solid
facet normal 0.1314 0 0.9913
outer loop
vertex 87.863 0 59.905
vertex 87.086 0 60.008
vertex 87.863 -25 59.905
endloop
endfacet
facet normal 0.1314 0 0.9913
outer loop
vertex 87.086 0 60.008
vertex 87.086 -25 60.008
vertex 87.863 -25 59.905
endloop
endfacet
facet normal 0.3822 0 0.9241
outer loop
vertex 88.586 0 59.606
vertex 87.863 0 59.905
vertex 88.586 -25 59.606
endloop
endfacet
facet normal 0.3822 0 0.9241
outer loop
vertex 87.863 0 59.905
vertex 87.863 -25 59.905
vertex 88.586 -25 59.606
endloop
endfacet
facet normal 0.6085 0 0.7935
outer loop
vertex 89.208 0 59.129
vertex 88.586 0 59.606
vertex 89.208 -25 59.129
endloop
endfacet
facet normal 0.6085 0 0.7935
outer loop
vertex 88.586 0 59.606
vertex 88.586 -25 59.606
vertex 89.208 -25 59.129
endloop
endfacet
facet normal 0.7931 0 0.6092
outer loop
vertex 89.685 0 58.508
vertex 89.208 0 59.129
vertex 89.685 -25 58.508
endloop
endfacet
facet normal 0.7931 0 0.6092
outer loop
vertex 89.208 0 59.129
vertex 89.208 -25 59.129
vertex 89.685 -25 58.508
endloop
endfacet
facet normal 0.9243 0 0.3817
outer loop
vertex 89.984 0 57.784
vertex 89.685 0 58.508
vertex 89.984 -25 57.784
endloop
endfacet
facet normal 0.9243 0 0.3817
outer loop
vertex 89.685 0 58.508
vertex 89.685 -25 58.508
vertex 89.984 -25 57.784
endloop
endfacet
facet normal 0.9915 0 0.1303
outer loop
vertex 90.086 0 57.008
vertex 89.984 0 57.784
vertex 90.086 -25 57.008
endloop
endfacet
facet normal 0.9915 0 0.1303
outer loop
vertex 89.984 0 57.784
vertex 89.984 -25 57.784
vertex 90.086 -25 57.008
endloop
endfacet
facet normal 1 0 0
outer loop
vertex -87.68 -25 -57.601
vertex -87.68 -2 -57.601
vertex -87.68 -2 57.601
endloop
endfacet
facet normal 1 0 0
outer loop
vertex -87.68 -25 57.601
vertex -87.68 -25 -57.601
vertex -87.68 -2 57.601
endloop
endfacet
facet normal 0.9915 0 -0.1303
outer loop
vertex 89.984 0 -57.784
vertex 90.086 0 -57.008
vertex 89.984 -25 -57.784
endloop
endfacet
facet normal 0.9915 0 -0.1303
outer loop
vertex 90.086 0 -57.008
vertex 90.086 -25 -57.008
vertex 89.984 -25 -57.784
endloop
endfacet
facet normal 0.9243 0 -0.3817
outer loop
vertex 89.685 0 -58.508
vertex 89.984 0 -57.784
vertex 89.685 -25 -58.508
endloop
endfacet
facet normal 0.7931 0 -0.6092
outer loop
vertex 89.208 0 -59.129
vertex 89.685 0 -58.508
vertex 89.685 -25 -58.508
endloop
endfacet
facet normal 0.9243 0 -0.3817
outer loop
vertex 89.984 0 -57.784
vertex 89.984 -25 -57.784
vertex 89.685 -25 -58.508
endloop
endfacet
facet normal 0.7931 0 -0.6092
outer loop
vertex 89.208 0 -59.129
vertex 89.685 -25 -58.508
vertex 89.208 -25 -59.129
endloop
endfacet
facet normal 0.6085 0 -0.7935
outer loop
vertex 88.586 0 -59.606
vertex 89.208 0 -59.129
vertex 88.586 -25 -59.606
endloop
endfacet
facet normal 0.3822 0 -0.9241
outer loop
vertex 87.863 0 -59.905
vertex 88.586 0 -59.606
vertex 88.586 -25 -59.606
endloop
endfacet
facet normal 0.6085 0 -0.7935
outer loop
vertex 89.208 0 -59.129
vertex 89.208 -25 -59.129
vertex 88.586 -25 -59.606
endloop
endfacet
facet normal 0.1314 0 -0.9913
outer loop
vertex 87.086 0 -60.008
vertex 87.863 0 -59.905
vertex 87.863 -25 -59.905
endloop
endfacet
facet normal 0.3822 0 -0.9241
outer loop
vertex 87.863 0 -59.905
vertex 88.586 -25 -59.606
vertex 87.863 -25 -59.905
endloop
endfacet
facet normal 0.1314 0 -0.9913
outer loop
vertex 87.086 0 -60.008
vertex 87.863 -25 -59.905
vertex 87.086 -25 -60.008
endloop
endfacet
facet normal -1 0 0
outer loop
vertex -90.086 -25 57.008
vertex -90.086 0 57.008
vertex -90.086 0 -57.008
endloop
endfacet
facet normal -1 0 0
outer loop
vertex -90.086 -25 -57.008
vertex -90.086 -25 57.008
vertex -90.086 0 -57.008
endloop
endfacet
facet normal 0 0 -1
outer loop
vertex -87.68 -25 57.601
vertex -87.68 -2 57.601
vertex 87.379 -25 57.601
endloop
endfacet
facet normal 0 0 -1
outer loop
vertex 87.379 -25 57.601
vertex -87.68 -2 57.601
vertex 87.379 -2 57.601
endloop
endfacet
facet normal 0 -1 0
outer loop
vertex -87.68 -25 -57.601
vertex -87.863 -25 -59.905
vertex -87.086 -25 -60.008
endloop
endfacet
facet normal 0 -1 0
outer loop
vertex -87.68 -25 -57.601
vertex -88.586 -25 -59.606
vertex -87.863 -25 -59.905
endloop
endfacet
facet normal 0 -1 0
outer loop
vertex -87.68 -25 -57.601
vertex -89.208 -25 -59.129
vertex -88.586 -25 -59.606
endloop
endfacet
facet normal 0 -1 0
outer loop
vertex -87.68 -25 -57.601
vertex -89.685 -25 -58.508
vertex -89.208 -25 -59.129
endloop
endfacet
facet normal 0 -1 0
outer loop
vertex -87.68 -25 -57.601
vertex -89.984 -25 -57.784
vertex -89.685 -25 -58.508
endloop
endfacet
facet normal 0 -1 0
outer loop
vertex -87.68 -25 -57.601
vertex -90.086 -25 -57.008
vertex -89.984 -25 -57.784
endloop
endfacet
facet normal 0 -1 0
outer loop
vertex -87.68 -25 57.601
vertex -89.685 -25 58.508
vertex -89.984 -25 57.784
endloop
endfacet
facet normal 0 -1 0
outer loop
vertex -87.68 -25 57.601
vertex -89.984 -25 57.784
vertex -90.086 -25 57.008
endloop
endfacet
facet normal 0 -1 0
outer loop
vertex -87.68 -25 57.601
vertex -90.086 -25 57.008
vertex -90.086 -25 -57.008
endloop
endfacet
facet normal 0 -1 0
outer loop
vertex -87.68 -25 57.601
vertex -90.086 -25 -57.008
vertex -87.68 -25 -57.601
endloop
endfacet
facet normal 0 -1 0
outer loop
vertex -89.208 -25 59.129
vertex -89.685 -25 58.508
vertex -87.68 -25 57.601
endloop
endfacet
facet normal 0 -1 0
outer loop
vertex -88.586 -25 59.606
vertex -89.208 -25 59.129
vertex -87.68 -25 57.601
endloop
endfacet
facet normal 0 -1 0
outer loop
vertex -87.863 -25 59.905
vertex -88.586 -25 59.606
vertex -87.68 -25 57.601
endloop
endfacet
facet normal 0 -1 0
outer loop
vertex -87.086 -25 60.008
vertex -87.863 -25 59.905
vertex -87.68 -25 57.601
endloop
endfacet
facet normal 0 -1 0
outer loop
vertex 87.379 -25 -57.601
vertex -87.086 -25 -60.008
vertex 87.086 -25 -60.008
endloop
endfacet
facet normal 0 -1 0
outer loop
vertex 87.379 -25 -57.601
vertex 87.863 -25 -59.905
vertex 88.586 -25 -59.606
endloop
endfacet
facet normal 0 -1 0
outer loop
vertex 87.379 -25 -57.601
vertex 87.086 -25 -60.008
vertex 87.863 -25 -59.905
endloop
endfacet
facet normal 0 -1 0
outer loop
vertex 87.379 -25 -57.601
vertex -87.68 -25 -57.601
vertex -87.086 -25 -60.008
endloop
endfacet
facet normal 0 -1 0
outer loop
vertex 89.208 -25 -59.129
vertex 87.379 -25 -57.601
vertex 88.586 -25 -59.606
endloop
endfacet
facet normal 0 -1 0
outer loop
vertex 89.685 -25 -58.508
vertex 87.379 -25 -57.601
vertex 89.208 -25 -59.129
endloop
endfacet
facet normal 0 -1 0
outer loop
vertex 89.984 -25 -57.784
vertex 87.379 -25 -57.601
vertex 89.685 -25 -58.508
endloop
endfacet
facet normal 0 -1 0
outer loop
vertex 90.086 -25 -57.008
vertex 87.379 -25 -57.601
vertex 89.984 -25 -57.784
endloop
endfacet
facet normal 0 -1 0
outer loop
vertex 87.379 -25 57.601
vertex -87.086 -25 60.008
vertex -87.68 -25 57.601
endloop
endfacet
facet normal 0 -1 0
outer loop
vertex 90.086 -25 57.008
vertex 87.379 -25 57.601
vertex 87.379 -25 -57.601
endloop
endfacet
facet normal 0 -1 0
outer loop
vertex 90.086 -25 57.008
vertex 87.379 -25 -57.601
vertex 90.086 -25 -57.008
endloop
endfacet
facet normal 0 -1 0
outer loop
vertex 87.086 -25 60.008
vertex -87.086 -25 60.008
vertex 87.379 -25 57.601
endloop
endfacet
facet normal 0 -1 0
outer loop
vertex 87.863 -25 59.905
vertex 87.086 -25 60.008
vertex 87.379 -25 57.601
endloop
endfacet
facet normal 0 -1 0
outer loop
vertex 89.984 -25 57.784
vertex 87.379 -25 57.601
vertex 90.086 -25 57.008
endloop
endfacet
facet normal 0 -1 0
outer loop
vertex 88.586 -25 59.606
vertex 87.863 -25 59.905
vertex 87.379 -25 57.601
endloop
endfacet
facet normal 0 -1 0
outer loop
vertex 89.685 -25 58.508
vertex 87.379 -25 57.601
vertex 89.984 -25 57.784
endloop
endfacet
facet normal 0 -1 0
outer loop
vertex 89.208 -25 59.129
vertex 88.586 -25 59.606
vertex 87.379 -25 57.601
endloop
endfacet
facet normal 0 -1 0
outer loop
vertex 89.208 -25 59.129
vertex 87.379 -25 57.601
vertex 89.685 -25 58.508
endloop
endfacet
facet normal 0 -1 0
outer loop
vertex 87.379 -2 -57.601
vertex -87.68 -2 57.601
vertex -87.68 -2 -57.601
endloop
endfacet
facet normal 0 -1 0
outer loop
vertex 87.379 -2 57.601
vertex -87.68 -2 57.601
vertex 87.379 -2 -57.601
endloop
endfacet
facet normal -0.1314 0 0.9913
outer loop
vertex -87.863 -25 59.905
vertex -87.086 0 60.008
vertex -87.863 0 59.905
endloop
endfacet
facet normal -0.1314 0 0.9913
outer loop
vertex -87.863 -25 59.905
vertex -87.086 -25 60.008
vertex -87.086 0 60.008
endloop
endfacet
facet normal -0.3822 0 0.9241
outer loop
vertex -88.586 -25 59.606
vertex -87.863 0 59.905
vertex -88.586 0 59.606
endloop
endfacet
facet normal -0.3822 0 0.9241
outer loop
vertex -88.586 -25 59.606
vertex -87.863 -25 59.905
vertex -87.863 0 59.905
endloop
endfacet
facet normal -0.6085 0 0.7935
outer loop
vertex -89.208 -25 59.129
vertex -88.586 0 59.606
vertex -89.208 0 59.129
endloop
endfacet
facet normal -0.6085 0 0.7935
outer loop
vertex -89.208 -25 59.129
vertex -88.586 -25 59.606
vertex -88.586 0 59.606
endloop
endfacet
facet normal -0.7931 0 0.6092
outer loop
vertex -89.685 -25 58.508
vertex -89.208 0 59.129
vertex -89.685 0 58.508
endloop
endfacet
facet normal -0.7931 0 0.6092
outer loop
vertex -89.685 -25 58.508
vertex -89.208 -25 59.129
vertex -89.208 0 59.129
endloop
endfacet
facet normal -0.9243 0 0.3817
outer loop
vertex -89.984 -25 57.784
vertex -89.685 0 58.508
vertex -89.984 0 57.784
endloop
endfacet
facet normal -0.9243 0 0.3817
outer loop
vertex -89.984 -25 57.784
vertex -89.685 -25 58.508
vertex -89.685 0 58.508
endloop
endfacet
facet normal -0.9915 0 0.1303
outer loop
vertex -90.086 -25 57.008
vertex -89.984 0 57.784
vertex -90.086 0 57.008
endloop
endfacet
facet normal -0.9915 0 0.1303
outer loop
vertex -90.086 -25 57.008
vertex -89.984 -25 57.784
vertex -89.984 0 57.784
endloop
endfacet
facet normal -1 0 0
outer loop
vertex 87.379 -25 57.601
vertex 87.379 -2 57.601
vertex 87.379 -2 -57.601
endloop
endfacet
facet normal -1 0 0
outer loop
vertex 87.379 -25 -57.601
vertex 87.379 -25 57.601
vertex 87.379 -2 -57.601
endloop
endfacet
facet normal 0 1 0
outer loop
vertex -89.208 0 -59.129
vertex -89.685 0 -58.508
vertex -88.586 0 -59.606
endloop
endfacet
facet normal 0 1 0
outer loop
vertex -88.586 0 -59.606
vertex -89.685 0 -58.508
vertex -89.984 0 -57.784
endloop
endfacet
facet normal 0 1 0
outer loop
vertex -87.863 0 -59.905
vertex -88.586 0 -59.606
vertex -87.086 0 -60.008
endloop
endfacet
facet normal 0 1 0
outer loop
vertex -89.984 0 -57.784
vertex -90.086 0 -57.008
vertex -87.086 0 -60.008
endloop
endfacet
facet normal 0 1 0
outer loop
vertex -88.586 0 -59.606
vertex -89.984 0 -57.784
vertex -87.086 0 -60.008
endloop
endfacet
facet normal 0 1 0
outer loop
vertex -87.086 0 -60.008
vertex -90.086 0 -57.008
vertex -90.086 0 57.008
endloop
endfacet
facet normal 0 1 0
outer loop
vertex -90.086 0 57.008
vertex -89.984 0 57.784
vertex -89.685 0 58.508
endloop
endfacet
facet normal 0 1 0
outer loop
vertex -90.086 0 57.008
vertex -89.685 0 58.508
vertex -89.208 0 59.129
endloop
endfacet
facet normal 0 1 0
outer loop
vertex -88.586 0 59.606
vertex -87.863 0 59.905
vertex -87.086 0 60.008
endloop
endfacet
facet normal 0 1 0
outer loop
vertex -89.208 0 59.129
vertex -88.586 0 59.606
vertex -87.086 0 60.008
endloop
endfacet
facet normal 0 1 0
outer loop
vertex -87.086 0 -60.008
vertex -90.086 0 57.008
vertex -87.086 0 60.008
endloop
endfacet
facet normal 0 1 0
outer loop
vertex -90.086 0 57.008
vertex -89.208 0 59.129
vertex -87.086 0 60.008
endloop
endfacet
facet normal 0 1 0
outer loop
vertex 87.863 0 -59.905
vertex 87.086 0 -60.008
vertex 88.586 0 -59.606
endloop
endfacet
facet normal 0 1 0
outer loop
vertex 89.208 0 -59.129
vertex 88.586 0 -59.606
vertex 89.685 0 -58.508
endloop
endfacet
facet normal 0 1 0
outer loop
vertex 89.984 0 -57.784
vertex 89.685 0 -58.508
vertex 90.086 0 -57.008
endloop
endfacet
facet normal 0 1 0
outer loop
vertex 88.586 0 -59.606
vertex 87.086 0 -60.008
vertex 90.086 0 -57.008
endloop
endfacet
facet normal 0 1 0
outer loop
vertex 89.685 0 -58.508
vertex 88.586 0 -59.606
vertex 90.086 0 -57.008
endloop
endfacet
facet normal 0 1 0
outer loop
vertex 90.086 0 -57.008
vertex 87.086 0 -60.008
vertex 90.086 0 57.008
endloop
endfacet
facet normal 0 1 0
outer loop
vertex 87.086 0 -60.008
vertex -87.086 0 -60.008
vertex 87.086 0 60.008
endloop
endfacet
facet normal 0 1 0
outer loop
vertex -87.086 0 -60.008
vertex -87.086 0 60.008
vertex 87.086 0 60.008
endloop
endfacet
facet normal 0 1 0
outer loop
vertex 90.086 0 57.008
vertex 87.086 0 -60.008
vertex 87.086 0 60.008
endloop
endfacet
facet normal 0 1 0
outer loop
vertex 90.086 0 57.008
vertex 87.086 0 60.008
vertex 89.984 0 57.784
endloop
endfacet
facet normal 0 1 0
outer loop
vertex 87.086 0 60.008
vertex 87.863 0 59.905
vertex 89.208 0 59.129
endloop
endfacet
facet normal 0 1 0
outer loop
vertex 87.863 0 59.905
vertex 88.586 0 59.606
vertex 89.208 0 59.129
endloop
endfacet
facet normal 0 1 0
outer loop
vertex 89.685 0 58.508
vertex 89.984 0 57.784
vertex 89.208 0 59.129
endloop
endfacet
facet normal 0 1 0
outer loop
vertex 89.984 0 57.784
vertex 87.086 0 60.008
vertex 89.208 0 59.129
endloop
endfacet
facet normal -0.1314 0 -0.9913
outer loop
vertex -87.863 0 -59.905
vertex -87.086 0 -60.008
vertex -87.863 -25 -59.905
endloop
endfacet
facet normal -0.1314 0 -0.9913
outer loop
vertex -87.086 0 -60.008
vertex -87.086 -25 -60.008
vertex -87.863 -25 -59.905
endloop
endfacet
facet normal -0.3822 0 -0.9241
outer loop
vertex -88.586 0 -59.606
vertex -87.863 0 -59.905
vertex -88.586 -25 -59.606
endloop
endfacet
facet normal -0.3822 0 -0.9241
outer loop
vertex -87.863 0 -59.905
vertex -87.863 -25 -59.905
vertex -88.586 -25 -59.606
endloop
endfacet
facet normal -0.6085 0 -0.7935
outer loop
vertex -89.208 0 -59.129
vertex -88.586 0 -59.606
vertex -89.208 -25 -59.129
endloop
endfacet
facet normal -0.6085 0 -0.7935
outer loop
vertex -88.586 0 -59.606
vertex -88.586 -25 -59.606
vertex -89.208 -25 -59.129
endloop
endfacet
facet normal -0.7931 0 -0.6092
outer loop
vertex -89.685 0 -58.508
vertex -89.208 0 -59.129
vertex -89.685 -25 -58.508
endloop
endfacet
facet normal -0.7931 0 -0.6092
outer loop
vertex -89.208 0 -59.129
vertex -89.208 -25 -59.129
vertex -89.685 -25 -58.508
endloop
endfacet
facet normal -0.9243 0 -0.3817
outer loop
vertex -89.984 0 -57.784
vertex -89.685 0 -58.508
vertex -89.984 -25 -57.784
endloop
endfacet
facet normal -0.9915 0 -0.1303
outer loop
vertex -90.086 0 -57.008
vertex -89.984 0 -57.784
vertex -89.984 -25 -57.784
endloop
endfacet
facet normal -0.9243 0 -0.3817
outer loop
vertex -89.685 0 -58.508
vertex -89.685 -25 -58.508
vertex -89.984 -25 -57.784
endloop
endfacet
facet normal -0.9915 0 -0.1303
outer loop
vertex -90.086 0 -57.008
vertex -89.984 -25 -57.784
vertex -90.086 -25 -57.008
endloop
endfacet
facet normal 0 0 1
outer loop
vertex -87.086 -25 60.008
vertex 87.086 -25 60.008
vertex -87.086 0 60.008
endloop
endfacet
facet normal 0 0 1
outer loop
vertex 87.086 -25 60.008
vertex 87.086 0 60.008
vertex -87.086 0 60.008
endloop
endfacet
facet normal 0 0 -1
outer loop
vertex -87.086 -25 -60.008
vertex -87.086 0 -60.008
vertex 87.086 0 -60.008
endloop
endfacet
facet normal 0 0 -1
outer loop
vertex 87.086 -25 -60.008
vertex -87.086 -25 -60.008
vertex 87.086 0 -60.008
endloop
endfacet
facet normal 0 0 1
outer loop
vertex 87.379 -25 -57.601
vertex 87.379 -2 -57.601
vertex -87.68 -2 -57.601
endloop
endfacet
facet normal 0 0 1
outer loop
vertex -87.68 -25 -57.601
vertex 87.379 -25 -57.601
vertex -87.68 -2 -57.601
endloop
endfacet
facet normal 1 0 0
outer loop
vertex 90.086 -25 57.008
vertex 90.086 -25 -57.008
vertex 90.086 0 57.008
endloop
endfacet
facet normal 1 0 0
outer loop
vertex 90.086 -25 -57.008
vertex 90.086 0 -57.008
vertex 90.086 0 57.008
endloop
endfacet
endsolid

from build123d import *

# Parameters (mm, degrees)
F1_DEPTH  = 25
F2_DEPTH  = 25
F3_DEPTH  = 25
F4_DEPTH  = 25
F5_DEPTH  = 25
F6_DEPTH  = 25
F7_DEPTH  = 25
F8_DEPTH  = 25
F0_W      = 87.680131197
F0_H      = 57.6011836529
F0_W_2    = 87.3793363571
F9_DEPTH  = 2
F10_DEPTH = 2
F11_DEPTH = 2
F12_DEPTH = 2
F13_R     = 3
F14_R     = 3
F15_R     = 3
F16_R     = 3


with BuildPart() as f1:
    # F0 (on Front) → F1 (new body)
    with BuildSketch(Plane.XZ):
        Polygon((0, 57.6011836529), (0, 60.0075013936), (-90.0864452124, 60.0075013936), (-87.680131197, 57.6011836529), align=None)
    extrude(amount=F1_DEPTH)

    # F0 (on Front) → F2 (join)
    with BuildSketch(Plane.XZ):
        Polygon((87.3793363571, 57.6011836529), (90.0864452124, 60.0075013936), (0, 60.0075013936), (0, 57.6011836529), align=None)
    extrude(amount=F2_DEPTH)

    # F0 (on Front) → F3 (join)
    with BuildSketch(Plane.XZ):
        Polygon((-87.680131197, 57.6011836529), (-90.0864452124, 60.0075013936), (-90.0864452124, 0), (-87.680131197, 0), align=None)
    extrude(amount=F3_DEPTH)

    # F0 (on Front) → F4 (join)
    with BuildSketch(Plane.XZ):
        Polygon((-87.680131197, 0), (-90.0864452124, 0), (-90.0864452124, -60.0075013936), (-87.680131197, -57.6011836529), align=None)
    extrude(amount=F4_DEPTH)

    # F0 (on Front) → F5 (join)
    with BuildSketch(Plane.XZ):
        Polygon((-90.0864452124, -60.0075013936), (-0.1503974199, -60.0075013936), (-0.1503974199, -57.6011836529), (-87.680131197, -57.6011836529), align=None)
    extrude(amount=F5_DEPTH)

    # F0 (on Front) → F6 (join)
    with BuildSketch(Plane.XZ):
        Polygon((-0.1503974199, -60.0075013936), (90.0864452124, -60.0075013936), (87.3793363571, -57.6011836529), (-0.1503974199, -57.6011836529), align=None)
    extrude(amount=F6_DEPTH)

    # F0 (on Front) → F7 (join)
    with BuildSketch(Plane.XZ):
        Polygon((90.0864452124, 0), (90.0864452124, 60.0075013936), (87.3793363571, 57.6011836529), (87.3793363571, 0), align=None)
    extrude(amount=F7_DEPTH)

    # F0 (on Front) → F8 (join)
    with BuildSketch(Plane.XZ):
        Polygon((90.0864452124, -60.0075013936), (90.0864452124, 0), (87.3793363571, 0), (87.3793363571, -57.6011836529), align=None)
    extrude(amount=F8_DEPTH)

    # F0 (on Front) → F9 (join)
    with BuildSketch(Plane.XZ):
        with Locations((-43.8400655985, 28.8005918264)):
            Rectangle(F0_W, F0_H)
        with Locations((43.6896681786, 28.8005918264)):
            Rectangle(F0_W_2, F0_H)
    extrude(amount=F9_DEPTH)

    # F0 (on Front) → F10 (join)
    with BuildSketch(Plane.XZ):
        with Locations((43.6896681786, 28.8005918264)):
            Rectangle(F0_W_2, F0_H)
    extrude(amount=F10_DEPTH)

    # F0 (on Front) → F11 (join)
    with BuildSketch(Plane.XZ):
        Polygon((-0.1503974199, -57.6011836529), (0, 0), (-87.680131197, 0), (-87.680131197, -57.6011836529), align=None)
    extrude(amount=F11_DEPTH)

    # F0 (on Front) → F12 (join)
    with BuildSketch(Plane.XZ):
        Polygon((87.3793363571, -57.6011836529), (87.3793363571, 0), (0, 0), (-0.1503974199, -57.6011836529), align=None)
    extrude(amount=F12_DEPTH)

    # F13
    f13_edges = [f1.edges().sort_by_distance(p)[0] for p in [
        (-90.086445, -12.5, 60.007501),
    ]]
    fillet(f13_edges, radius=F13_R)

    # F14
    f14_edges = [f1.edges().sort_by_distance(p)[0] for p in [
        (90.086445, -12.5, 60.007501),
    ]]
    fillet(f14_edges, radius=F14_R)

    # F15
    f15_edges = [f1.edges().sort_by_distance(p)[0] for p in [
        (90.086445, -12.5, -60.007501),
    ]]
    fillet(f15_edges, radius=F15_R)

    # F16
    f16_edges = [f1.edges().sort_by_distance(p)[0] for p in [
        (-90.086445, -12.5, -60.007501),
    ]]
    fillet(f16_edges, radius=F16_R)


solid = f1.part
